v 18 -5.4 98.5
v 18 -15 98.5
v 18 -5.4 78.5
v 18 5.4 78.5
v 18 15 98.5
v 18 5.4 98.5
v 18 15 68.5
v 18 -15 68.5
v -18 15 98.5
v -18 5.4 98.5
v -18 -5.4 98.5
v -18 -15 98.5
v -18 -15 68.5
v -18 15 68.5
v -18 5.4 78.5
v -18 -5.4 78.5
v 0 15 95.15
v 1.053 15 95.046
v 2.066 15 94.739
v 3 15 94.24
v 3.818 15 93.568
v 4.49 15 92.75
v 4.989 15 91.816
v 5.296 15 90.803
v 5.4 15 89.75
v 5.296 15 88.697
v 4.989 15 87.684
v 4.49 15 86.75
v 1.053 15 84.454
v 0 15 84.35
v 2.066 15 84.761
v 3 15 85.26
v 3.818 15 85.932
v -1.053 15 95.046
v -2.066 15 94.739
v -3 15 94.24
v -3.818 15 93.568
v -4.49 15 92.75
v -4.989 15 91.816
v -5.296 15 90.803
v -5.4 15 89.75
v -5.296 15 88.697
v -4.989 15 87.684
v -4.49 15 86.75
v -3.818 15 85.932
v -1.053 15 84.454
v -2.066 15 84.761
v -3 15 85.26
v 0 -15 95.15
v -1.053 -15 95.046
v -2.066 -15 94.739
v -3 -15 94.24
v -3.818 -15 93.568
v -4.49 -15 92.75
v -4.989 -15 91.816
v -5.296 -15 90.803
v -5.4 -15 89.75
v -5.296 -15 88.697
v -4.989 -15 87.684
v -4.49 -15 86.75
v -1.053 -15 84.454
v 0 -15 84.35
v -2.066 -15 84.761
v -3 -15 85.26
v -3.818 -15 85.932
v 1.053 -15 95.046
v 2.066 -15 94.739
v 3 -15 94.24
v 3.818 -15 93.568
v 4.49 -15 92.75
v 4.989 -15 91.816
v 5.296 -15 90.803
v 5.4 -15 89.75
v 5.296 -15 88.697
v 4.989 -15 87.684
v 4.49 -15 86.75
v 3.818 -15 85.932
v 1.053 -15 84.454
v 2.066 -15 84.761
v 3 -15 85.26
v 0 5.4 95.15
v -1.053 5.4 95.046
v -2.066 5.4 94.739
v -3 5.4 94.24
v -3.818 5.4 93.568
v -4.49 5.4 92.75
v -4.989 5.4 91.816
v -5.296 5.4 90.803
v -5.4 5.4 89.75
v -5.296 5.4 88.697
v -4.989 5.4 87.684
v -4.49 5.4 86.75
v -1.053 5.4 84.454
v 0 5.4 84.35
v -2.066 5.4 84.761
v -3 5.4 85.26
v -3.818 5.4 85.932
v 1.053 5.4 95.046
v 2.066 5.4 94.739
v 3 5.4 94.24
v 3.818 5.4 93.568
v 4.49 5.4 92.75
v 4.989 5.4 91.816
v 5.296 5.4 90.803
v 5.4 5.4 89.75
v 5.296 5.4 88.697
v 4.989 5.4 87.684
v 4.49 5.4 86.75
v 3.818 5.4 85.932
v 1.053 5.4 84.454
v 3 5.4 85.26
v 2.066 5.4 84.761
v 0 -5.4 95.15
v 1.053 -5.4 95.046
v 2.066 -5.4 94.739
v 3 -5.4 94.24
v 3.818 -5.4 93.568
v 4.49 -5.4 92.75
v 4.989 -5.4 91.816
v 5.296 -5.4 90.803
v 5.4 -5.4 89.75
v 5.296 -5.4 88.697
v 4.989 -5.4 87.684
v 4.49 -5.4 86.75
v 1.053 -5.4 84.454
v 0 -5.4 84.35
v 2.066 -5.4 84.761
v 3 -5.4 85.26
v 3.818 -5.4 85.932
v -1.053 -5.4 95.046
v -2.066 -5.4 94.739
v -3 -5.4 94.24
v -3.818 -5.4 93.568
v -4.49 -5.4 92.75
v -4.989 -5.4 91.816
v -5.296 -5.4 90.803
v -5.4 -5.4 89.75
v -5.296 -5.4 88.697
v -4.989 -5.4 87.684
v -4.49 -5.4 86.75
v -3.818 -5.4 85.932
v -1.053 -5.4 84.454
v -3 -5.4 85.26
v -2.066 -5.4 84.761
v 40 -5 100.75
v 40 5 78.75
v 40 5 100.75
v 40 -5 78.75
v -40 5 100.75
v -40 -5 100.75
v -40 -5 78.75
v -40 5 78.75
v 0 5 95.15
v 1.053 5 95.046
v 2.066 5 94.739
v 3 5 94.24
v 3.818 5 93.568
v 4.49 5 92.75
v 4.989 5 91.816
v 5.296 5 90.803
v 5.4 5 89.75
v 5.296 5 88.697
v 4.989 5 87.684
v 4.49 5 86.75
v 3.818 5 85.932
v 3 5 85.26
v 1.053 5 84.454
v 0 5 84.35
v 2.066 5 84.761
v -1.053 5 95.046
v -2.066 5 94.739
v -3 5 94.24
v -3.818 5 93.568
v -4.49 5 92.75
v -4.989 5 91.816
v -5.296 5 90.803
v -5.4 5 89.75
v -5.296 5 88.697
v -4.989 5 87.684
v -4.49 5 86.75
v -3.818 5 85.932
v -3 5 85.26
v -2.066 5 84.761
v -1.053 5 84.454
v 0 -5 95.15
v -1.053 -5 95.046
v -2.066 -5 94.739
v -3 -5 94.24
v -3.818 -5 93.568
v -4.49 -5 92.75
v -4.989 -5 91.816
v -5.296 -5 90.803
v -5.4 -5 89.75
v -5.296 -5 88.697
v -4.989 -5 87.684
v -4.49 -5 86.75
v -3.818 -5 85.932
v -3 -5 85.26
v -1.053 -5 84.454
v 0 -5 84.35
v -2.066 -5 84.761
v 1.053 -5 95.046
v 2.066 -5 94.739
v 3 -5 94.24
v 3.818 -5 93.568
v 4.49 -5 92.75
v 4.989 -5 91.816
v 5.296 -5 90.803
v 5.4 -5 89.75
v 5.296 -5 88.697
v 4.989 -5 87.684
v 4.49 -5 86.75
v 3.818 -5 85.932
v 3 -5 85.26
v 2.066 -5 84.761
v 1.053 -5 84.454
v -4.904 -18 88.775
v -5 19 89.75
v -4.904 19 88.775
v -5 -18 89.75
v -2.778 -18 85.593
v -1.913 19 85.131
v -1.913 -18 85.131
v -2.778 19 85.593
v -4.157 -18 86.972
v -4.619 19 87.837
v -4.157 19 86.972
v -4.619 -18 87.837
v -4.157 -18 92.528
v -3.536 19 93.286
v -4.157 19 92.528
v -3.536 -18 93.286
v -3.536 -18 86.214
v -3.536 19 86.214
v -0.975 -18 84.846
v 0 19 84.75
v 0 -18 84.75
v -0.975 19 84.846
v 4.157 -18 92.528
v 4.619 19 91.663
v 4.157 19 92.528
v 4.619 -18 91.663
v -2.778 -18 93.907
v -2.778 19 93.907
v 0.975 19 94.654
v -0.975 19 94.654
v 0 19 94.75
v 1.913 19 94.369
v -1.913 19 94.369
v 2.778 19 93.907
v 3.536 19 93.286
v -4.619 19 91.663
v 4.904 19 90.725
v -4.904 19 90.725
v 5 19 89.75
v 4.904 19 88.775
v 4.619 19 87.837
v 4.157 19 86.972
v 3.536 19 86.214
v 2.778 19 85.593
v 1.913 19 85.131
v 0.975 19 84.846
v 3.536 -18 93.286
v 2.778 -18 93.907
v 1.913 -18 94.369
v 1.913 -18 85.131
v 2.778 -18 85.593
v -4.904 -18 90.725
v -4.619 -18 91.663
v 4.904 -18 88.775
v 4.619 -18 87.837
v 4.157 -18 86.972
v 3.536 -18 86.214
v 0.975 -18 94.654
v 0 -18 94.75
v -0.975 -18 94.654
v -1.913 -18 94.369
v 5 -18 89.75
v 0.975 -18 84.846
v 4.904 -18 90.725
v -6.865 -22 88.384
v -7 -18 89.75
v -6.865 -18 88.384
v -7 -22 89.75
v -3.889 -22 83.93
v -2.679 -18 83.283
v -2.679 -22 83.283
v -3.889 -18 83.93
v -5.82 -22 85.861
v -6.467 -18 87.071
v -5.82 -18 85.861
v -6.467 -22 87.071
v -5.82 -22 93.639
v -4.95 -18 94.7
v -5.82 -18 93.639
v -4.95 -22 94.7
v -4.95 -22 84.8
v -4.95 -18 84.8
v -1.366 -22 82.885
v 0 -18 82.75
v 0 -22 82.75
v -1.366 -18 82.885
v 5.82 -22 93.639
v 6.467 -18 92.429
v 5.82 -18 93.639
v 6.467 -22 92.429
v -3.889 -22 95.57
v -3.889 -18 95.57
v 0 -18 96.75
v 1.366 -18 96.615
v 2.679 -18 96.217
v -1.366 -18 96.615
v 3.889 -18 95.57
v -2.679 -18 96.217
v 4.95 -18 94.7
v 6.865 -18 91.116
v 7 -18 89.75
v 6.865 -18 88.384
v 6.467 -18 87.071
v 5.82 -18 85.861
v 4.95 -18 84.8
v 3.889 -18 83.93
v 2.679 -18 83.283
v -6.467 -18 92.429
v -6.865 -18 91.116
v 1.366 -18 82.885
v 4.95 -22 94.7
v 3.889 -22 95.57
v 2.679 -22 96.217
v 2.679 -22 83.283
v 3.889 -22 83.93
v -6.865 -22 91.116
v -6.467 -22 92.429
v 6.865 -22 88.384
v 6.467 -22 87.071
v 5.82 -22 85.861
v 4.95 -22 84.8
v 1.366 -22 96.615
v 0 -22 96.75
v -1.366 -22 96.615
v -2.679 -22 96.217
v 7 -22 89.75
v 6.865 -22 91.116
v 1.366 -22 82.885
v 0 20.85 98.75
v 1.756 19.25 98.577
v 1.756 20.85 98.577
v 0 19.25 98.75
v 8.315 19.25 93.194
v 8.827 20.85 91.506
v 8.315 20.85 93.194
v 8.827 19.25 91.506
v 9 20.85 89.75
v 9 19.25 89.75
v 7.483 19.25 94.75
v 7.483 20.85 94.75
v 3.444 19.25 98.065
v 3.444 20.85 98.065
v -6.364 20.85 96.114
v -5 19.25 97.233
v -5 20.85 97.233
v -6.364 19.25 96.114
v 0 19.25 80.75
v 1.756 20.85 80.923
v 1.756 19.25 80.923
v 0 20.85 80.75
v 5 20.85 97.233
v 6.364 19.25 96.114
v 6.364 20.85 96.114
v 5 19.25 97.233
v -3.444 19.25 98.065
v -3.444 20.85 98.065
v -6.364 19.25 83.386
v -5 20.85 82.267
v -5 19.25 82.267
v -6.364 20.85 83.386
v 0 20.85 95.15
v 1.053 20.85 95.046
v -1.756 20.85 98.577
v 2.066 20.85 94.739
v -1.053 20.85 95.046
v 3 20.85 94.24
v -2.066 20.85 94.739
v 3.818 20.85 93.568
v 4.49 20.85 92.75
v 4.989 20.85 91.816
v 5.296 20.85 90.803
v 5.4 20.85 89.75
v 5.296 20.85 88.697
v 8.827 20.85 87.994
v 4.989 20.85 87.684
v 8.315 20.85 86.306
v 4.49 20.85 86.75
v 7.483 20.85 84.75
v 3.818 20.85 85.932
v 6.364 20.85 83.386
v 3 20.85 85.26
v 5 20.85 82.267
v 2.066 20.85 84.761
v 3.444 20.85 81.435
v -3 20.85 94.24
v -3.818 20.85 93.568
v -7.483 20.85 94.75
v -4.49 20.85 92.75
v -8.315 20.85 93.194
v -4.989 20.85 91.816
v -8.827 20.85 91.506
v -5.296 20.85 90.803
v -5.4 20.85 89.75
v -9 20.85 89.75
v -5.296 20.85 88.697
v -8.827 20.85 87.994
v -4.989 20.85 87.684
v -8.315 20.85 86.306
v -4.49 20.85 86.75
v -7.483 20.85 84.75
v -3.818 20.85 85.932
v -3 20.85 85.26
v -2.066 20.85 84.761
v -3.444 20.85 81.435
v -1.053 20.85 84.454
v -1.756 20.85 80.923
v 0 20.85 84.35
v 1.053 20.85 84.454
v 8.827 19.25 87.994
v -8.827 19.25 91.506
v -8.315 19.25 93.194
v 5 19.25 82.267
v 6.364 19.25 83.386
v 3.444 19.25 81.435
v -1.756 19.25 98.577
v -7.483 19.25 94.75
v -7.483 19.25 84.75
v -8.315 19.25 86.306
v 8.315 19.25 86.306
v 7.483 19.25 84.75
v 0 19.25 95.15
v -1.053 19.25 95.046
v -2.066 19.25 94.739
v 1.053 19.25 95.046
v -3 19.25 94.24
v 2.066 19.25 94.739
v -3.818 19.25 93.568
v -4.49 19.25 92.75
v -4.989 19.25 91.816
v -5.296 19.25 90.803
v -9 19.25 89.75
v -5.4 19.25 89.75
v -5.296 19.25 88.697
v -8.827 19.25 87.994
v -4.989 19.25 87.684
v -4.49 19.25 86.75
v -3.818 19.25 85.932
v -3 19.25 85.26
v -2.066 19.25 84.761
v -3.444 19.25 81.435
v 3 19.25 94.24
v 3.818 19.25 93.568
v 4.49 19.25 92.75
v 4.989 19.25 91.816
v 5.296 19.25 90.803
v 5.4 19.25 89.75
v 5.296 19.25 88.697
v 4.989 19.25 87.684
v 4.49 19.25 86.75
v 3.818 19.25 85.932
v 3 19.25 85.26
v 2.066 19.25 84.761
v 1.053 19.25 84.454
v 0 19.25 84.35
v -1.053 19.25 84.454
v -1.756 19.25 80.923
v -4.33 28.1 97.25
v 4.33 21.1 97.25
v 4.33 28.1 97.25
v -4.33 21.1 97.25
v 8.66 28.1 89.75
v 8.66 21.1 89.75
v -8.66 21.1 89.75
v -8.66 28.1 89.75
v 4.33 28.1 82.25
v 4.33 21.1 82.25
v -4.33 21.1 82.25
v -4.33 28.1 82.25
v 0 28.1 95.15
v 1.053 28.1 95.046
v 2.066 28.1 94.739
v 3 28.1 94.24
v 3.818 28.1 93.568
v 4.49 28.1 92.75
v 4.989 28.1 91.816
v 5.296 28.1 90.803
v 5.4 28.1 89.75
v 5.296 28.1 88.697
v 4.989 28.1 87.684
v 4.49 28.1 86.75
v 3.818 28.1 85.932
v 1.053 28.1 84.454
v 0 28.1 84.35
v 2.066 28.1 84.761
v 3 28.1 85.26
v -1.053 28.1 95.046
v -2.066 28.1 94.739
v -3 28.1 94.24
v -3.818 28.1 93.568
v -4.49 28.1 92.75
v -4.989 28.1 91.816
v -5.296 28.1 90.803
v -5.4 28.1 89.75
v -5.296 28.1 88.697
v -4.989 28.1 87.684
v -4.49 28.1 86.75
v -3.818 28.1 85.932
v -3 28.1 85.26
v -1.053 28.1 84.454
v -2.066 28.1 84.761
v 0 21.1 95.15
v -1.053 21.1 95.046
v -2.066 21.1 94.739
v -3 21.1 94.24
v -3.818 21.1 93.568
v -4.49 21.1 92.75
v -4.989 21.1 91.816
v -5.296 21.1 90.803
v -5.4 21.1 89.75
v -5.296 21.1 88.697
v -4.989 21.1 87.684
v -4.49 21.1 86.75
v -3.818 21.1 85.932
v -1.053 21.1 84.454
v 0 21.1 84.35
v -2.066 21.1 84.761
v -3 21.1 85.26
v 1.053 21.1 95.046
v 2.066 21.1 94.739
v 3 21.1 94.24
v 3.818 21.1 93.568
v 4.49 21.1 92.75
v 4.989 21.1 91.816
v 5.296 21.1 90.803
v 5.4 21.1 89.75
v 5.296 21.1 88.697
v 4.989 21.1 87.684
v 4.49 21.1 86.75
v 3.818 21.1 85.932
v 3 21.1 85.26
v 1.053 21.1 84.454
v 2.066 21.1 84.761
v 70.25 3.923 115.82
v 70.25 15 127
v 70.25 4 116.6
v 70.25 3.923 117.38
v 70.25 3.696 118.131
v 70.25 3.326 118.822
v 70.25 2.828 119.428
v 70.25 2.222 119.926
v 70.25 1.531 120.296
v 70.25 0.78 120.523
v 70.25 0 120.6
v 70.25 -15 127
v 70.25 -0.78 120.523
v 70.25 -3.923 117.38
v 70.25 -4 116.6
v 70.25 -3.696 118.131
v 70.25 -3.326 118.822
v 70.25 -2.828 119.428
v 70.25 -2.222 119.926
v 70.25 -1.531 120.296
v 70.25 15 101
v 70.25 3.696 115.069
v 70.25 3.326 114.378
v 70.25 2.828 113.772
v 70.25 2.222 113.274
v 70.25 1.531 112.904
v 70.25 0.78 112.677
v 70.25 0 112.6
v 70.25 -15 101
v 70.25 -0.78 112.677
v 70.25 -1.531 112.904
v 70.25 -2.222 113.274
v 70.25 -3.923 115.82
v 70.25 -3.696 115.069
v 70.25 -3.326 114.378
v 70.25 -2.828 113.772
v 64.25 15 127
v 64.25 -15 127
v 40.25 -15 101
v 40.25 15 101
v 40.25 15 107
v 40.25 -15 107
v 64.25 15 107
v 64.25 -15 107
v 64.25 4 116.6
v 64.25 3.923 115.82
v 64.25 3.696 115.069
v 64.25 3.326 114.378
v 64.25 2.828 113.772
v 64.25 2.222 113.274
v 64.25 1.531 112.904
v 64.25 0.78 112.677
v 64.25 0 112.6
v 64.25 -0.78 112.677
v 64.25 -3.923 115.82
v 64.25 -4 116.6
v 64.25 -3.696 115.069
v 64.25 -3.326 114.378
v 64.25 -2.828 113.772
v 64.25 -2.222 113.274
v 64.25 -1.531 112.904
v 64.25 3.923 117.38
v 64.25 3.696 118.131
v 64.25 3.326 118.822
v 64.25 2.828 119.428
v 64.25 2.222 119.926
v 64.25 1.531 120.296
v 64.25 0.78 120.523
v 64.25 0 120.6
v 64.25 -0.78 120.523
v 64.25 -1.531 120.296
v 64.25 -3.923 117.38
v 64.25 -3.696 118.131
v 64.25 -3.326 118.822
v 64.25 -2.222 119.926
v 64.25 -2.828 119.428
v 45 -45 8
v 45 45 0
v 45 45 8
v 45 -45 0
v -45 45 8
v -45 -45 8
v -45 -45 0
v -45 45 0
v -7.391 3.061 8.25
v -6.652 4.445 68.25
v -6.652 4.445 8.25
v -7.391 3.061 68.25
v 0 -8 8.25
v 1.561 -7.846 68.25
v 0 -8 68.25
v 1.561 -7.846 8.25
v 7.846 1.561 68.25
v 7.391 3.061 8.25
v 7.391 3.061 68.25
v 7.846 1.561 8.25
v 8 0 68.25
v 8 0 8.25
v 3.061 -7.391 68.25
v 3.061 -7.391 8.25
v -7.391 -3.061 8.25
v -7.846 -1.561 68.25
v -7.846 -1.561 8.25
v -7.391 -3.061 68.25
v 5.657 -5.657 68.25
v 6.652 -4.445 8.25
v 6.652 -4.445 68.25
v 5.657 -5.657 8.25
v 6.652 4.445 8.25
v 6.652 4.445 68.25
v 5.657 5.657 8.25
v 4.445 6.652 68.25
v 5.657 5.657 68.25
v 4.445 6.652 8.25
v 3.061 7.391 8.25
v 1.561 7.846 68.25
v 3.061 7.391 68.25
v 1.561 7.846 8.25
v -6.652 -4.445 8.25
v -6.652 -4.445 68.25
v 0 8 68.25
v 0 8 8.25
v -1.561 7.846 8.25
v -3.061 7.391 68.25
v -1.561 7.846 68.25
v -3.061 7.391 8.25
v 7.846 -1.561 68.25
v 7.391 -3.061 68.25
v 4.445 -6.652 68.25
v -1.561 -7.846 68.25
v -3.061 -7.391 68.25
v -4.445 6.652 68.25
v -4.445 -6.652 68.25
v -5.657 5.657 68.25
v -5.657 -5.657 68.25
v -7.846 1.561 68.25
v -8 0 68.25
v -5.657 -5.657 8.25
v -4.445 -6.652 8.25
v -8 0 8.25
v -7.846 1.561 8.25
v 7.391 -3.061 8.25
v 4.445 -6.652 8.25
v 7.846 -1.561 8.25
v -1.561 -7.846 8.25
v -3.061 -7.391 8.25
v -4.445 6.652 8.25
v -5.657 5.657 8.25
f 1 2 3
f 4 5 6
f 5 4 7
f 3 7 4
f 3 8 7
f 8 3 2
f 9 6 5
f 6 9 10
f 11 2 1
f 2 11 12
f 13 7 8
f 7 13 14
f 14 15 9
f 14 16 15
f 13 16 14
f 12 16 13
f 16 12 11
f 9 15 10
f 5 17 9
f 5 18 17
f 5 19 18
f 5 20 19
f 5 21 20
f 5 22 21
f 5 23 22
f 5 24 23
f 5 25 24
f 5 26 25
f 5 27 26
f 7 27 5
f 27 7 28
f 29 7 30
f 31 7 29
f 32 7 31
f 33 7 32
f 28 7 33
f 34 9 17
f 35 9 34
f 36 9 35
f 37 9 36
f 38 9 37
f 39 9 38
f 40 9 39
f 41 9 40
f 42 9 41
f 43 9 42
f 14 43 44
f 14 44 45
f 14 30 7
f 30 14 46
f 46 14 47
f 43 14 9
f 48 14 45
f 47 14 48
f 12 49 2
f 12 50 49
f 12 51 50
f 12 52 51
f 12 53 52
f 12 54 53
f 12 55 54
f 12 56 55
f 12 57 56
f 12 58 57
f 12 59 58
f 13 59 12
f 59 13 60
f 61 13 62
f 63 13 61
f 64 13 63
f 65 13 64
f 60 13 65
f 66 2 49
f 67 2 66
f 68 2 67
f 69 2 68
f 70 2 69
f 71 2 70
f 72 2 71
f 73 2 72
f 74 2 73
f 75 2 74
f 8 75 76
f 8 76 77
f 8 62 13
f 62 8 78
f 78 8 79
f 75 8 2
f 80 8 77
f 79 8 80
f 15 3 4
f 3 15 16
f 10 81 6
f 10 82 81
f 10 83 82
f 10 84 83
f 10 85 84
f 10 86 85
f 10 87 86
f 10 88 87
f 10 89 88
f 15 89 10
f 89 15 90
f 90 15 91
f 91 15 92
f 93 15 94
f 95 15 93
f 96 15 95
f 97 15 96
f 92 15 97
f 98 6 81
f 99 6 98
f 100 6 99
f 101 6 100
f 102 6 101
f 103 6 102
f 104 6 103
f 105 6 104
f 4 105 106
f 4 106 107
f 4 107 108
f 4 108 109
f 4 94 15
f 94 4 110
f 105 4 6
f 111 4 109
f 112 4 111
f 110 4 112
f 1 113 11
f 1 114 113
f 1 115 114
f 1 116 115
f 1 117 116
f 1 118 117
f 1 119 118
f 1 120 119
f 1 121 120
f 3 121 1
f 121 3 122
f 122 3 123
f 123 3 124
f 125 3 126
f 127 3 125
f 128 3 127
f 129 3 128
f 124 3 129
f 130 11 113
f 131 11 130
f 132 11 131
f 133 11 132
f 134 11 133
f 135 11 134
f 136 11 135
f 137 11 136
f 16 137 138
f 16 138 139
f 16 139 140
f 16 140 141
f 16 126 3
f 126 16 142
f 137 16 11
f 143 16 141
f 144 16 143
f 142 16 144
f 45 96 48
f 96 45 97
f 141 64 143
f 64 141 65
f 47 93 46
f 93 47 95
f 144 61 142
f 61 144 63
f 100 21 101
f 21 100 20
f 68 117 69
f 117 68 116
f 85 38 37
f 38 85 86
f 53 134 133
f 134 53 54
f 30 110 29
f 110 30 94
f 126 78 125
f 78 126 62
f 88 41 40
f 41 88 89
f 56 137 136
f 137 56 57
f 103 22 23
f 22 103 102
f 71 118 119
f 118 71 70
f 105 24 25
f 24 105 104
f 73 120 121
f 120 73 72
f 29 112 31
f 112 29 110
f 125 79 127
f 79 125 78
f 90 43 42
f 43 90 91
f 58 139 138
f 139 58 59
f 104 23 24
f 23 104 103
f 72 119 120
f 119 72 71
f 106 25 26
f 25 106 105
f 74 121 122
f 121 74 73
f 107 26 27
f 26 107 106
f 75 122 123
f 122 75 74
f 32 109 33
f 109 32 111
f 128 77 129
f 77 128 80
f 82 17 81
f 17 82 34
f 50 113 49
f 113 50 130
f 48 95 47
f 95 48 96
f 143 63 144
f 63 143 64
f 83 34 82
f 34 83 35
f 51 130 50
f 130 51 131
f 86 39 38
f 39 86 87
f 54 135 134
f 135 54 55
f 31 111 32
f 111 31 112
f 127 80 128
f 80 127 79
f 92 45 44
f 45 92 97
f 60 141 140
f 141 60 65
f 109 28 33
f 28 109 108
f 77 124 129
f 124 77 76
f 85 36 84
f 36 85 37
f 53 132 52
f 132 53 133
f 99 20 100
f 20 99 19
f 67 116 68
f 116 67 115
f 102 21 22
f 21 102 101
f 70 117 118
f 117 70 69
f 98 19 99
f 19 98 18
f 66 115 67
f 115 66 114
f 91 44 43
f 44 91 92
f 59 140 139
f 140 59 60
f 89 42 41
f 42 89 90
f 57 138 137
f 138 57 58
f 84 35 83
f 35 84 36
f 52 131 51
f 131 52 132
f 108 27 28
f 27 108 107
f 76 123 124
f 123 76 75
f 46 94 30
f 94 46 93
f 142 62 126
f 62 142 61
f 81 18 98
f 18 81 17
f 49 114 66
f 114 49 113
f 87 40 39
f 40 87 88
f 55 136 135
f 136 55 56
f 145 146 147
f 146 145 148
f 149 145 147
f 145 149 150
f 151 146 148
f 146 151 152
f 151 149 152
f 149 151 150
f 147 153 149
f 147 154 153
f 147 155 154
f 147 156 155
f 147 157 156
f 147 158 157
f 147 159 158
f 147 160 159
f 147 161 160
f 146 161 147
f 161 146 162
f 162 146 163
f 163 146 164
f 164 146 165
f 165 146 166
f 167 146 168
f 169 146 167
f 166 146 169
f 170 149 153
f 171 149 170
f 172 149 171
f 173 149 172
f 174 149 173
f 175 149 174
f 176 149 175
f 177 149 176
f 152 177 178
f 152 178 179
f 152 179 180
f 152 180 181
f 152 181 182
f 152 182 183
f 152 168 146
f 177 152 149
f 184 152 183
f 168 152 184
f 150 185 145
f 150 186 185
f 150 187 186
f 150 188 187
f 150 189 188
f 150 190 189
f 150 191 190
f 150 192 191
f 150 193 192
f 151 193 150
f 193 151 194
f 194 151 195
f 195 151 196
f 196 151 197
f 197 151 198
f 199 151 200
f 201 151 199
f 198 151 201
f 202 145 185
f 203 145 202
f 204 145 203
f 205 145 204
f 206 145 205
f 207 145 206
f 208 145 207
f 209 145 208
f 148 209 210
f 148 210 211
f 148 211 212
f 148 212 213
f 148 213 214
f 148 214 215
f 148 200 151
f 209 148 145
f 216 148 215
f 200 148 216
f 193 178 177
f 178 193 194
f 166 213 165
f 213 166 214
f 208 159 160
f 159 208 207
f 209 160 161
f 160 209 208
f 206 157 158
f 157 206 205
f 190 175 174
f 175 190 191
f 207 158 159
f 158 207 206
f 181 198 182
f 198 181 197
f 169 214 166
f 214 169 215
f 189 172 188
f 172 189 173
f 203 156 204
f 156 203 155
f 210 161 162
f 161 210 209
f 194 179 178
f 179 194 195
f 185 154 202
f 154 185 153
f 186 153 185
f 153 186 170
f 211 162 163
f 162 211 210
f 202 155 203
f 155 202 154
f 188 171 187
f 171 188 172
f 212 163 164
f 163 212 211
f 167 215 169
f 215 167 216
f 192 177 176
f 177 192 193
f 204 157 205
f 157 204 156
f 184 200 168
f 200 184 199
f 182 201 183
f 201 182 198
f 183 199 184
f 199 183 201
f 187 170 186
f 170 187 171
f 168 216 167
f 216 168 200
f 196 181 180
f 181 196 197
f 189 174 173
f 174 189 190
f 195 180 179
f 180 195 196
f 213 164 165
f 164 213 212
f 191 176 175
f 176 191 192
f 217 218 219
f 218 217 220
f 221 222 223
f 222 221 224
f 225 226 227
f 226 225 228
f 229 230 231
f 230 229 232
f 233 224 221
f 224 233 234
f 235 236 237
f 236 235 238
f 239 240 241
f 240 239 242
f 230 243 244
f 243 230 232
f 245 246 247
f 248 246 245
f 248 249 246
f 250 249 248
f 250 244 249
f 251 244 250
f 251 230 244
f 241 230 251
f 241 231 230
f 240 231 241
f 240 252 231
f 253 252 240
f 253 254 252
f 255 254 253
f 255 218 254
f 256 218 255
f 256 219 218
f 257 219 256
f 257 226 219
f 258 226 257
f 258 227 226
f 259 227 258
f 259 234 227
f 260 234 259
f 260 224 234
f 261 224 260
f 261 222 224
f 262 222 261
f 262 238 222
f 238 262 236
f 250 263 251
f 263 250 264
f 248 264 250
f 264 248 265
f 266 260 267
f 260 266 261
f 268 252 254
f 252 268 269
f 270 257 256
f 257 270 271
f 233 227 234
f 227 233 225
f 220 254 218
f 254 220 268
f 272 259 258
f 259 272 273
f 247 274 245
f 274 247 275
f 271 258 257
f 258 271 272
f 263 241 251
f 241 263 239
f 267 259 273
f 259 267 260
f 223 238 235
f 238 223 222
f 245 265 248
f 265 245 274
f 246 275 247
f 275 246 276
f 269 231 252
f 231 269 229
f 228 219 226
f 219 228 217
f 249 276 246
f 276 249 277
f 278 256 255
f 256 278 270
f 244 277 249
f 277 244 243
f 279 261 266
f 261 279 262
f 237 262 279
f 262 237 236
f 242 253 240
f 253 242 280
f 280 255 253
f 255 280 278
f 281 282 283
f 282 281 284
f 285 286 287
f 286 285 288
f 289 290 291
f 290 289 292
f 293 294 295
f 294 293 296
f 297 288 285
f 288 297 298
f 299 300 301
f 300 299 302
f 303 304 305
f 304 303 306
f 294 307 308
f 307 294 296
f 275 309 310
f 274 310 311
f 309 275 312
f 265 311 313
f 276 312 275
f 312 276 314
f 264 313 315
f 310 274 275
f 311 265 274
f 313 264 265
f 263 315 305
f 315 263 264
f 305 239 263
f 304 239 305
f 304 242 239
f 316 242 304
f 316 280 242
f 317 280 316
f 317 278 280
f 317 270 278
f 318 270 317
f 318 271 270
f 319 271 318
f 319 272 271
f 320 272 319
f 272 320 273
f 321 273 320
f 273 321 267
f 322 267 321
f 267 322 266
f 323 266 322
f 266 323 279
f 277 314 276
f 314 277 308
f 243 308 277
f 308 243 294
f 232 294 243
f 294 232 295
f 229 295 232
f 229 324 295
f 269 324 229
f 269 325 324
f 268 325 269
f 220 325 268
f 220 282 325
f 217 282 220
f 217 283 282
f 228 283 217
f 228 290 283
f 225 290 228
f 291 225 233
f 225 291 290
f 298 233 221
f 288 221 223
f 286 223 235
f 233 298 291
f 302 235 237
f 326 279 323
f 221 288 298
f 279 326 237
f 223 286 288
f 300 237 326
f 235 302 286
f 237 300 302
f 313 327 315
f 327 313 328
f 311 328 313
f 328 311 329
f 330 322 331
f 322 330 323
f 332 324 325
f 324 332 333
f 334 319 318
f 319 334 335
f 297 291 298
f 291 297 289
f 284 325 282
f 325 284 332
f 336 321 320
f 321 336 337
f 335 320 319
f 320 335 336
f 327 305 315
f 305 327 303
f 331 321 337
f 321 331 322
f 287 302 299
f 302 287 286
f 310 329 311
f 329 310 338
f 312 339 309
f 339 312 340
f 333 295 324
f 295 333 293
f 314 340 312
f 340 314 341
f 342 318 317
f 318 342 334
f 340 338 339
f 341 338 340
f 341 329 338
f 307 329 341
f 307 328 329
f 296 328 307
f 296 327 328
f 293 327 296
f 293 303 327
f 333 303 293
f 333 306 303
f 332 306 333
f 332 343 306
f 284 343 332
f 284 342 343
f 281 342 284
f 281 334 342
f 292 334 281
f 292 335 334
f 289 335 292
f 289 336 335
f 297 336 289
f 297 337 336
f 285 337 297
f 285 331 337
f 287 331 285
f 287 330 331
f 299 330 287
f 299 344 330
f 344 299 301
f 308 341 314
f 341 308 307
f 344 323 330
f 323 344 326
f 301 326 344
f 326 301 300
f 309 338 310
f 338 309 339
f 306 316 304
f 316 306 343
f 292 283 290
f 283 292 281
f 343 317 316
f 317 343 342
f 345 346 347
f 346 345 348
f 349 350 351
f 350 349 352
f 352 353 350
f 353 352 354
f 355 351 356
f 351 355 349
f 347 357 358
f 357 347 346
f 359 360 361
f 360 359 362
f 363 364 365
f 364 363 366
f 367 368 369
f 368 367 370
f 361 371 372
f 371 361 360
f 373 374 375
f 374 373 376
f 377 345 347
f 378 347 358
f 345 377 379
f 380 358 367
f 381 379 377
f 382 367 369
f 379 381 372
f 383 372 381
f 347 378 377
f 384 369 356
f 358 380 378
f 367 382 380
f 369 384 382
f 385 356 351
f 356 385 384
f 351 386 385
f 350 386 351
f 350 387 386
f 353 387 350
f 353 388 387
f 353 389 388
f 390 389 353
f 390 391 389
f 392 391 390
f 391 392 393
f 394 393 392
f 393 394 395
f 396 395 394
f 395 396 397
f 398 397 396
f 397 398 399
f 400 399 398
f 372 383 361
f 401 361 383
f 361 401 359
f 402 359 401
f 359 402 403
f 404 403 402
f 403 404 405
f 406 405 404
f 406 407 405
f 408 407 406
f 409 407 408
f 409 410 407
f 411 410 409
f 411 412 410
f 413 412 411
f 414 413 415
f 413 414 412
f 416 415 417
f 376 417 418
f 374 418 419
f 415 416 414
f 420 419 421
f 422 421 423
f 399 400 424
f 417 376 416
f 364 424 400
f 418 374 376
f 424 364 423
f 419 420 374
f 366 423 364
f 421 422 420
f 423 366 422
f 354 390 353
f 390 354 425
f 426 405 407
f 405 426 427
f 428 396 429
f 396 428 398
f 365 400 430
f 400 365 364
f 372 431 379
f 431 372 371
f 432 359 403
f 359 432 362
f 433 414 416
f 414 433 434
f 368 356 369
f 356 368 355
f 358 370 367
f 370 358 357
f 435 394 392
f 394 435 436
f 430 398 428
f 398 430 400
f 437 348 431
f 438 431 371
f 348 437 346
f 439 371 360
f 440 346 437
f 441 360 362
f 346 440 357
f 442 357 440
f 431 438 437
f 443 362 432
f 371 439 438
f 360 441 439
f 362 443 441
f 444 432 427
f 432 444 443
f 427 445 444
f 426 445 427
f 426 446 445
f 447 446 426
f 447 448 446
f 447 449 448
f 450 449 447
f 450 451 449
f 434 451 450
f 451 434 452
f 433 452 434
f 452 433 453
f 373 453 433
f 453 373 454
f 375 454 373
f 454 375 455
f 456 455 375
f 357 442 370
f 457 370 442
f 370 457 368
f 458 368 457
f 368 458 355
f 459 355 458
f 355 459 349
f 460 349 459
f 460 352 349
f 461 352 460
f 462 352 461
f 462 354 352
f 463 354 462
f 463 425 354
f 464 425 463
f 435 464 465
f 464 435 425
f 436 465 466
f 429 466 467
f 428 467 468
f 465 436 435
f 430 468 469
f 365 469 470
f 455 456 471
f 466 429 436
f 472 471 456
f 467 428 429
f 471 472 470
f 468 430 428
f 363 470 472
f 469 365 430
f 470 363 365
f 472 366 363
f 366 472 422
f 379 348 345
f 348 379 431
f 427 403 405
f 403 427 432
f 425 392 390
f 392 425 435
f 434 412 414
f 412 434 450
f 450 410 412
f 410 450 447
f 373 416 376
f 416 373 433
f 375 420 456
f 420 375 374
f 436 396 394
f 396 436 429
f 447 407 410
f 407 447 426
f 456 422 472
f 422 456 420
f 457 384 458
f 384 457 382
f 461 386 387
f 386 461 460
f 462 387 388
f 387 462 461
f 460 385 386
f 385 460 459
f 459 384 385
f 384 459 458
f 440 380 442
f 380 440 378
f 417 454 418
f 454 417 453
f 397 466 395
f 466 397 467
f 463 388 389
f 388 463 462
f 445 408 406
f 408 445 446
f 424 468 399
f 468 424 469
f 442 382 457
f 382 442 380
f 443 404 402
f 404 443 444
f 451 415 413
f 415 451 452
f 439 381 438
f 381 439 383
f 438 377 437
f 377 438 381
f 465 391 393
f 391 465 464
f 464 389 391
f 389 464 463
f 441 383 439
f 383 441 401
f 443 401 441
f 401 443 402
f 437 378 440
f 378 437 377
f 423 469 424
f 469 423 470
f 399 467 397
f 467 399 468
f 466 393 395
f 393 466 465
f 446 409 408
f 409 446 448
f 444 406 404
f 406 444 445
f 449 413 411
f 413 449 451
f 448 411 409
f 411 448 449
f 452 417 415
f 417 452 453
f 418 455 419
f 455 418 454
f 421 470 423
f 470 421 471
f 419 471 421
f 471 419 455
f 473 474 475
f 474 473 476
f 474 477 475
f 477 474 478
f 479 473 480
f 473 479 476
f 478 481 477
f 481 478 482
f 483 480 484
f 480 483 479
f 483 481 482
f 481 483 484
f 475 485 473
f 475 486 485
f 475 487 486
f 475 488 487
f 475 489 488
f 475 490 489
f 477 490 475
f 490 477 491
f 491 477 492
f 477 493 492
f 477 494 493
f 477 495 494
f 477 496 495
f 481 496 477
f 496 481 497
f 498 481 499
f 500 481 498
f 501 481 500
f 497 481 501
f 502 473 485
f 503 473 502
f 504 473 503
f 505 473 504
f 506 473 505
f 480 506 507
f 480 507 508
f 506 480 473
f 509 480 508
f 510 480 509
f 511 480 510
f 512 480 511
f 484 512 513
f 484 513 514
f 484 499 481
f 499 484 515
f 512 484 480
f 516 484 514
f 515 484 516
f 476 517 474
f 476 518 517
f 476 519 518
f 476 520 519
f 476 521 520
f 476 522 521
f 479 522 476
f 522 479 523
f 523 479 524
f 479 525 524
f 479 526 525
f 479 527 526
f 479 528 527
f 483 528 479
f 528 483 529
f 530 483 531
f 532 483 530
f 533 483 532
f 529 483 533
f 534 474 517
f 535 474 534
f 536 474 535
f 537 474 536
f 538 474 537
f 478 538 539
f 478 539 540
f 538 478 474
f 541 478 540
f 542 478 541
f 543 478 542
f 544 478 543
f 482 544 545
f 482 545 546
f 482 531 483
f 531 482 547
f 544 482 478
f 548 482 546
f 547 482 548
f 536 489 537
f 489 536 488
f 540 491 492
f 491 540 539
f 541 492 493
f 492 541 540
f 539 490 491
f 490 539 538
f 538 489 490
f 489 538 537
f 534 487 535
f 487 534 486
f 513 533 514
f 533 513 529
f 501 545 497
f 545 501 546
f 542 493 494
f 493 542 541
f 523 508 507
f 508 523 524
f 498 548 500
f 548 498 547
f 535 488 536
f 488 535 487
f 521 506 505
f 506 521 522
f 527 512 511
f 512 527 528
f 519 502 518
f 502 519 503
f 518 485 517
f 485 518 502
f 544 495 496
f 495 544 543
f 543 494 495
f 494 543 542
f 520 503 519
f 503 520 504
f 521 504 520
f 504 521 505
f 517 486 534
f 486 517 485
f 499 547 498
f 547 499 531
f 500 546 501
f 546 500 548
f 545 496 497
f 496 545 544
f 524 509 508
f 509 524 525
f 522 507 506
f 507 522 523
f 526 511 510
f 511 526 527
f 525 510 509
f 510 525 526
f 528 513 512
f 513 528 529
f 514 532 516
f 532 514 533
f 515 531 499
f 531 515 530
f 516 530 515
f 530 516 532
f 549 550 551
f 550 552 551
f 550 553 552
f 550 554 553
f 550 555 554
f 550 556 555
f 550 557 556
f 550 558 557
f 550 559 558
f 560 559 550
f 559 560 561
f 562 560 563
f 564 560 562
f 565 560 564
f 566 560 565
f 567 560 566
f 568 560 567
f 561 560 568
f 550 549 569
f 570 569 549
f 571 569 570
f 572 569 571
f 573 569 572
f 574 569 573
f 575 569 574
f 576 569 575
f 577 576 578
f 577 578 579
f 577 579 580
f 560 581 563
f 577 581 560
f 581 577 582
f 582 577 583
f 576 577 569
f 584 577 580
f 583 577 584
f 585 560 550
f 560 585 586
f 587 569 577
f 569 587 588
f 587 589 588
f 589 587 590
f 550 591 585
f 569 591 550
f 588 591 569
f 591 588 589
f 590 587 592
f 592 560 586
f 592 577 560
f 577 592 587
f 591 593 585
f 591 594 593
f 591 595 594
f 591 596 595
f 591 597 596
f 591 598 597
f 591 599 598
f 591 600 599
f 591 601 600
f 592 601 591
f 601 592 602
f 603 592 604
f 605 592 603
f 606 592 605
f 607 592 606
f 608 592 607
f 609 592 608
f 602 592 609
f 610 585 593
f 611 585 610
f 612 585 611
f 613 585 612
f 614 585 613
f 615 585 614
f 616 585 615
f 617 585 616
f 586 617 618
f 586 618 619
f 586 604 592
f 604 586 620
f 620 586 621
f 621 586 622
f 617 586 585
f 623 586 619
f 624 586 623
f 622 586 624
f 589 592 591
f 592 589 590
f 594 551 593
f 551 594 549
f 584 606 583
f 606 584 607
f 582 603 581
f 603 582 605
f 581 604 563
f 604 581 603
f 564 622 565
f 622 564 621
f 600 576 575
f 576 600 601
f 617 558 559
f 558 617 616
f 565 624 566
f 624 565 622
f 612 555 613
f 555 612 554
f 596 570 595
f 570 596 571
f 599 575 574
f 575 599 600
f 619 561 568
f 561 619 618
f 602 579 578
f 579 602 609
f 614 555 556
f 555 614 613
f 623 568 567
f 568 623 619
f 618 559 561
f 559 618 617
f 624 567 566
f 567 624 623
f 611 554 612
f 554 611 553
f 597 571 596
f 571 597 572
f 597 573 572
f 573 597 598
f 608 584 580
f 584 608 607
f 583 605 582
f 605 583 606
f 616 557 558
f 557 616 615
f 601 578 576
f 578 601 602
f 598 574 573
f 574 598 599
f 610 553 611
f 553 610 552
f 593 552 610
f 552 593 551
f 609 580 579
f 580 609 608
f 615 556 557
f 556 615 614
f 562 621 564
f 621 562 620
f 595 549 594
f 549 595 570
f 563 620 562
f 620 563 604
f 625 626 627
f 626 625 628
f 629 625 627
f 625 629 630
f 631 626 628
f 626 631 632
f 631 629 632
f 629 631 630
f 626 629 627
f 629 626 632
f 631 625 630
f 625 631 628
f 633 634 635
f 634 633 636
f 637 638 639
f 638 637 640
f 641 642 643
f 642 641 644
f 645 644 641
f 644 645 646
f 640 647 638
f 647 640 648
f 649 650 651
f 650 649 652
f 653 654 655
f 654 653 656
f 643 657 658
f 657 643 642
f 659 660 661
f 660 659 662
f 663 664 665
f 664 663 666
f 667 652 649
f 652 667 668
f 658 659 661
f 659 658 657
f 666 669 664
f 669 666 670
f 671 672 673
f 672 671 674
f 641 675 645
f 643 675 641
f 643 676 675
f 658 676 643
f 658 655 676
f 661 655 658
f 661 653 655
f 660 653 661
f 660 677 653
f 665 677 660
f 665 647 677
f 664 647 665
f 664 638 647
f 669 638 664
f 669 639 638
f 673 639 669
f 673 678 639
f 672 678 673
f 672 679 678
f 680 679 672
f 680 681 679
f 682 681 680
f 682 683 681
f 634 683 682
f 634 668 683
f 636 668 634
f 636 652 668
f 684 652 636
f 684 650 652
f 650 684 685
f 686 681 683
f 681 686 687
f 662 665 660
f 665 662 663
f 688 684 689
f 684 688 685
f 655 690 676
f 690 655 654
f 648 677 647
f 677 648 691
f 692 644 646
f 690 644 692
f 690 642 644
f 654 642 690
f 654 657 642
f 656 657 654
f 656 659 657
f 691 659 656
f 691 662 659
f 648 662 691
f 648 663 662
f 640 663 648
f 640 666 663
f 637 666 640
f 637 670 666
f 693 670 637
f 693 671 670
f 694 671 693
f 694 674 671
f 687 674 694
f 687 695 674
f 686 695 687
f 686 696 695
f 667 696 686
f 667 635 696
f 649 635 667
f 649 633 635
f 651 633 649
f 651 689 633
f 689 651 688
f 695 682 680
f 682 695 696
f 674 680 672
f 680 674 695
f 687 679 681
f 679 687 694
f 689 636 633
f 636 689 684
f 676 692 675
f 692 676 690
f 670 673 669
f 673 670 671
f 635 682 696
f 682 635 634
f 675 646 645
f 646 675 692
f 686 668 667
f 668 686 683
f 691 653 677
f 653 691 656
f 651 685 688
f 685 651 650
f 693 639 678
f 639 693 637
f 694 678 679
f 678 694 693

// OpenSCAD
$fn = 32;

// ------------------------------------------------------------------------
// Lamp arm: column d16 x 60 mm, arm 80 mm
// Every part is its own module, assembly() places every instance.
// ------------------------------------------------------------------------

// --- part 1 ---
module lamp_base() {
  difference() {
    translate([-45, -45, 0]) cube([90, 90, 8]);
  }
}

// --- part 2 ---
module lamp_column() {
  cylinder(h = 60, d = 16);
}

// --- part 3 ---
module head_fork() {
  difference() {
    translate([-18, -15, 0]) cube([36, 30, 30]);
    translate([-19, -5.4, 10]) cube([38, 10.8, 21]);
    translate([0, 0, 21.25]) rotate([90, 0, 0]) cylinder(h = 32, d = 10.8, center = true);
  }
}

// --- part 4 ---
module lamp_arm() {
  difference() {
    translate([-40, -5, 0]) cube([80, 10, 22]);
    translate([0, 0, 11]) rotate([90, 0, 0]) cylinder(h = 12, d = 10.8, center = true);
  }
}

// --- part 5 ---
module arm_pin() {
  rotate([0, 90, 0]) cylinder(h = 38, d = 10, center = true);
  translate([-22, 0, 0]) rotate([0, 90, 0]) cylinder(h = 4, d = 14);
}

// --- part 6 ---
module arm_washer() {
  difference() {
      translate([0, 0, 0]) cylinder(h = 1.6, d = 18);
      translate([0, 0, -1]) cylinder(h = 3.6, d = 10.8);
    }
}

// --- part 7 ---
module arm_nut() {
  difference() {
    linear_extrude(height = 7) polygon(points = [[8.66, 0], [4.33, 7.5], [-4.33, 7.5], [-8.66, 0], [-4.33, -7.5], [4.33, -7.5]]);
    translate([0, 0, -1]) cylinder(h = 9, d = 10.8);
  }
}

// --- part 8 ---
module shade_bracket() {
  difference() {
    translate([-15, -15, 0]) cube([30, 30, 26]);
    translate([-16, -16, 6]) cube([25, 32, 21]);
    translate([12, 0, 15.6]) rotate([0, 90, 0]) cylinder(h = 8, d = 8, center = true);
  }
}

// --- assembly ---
module assembly() {
  color([0.80, 0.24, 0.20]) translate([0, 0, 0]) rotate([0, 0, 0]) lamp_base();
  color([0.20, 0.45, 0.75]) translate([0, 0, 8.25]) rotate([0, 0, 0]) lamp_column();
  color([0.25, 0.62, 0.32]) translate([0, 0, 68.5]) rotate([0, 0, 0]) head_fork();
  color([0.92, 0.70, 0.18]) translate([0, 0, 78.75]) rotate([0, 0, 0]) lamp_arm();
  color([0.58, 0.35, 0.70]) translate([0, 0, 89.75]) rotate([0, 0, 90]) arm_pin();
  color([0.16, 0.66, 0.66]) translate([0, 20.85, 89.75]) rotate([90, 0, 0]) arm_washer();
  color([0.85, 0.48, 0.18]) translate([0, 28.1, 89.75]) rotate([90, 0, 0]) arm_nut();
  color([0.55, 0.60, 0.65]) translate([55.25, 0, 101]) rotate([0, 0, 0]) shade_bracket();
}

assembly();
